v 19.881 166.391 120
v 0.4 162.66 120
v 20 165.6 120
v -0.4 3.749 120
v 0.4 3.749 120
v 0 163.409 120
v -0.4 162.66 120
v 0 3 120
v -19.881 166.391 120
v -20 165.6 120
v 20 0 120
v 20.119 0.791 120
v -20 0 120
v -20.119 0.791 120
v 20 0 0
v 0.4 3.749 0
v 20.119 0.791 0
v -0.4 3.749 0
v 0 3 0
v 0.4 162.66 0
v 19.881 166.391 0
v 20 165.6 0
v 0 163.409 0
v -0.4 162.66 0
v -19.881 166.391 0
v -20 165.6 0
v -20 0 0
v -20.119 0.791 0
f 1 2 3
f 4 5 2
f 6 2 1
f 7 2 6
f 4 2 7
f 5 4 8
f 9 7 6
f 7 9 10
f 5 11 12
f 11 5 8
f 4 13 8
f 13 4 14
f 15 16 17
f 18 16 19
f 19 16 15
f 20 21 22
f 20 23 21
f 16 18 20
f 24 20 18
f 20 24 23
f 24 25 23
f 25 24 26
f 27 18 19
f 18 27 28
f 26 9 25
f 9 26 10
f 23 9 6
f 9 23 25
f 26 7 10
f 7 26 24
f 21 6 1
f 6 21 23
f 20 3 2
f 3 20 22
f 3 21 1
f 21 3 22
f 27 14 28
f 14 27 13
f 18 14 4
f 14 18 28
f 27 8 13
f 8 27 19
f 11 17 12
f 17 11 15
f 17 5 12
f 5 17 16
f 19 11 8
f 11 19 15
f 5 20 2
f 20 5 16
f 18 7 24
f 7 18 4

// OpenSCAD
height = 120;
width = 166;
depth = 40;
half_depth = depth / 2;
nozzle_diameter = 0.4;
base = 0.2;
triangle_height = 3;

translate([-nozzle_diameter, triangle_height, 0]) {
  cube([nozzle_diameter * 2, width - (2 * triangle_height), height]);
}
// translate([-depth / 2, 0, 0]) {
//   cube([depth, nozzle_diameter, height]);
// }
// translate([-depth / 2, width - nozzle_diameter, 0]) {
//   cube([depth, nozzle_diameter, height]);
// }

translate([-depth / 2, width - nozzle_diameter, 0]) {
  c = sqrt((half_depth * half_depth) + (triangle_height * triangle_height));
  a = asin(triangle_height / c);
  rotate(a, [0, 0, -1]) {
    cube([c, nozzle_diameter * 2, height]);
  }
  translate([half_depth, -triangle_height, 0]) {
    rotate(a, [0, 0, 1]) {
      cube([c, nozzle_diameter * 2, height]);
    }
  }
  translate([0, -width + nozzle_diameter, 0]) {
    rotate(a, [0, 0, 1]) {
      cube([c, nozzle_diameter * 2, height]);
    }
  }
  translate([half_depth, -width + nozzle_diameter + triangle_height, 0]) {
    rotate(a, [0, 0, -1]) {
      cube([c, nozzle_diameter * 2, height]);
    }
  }
}
